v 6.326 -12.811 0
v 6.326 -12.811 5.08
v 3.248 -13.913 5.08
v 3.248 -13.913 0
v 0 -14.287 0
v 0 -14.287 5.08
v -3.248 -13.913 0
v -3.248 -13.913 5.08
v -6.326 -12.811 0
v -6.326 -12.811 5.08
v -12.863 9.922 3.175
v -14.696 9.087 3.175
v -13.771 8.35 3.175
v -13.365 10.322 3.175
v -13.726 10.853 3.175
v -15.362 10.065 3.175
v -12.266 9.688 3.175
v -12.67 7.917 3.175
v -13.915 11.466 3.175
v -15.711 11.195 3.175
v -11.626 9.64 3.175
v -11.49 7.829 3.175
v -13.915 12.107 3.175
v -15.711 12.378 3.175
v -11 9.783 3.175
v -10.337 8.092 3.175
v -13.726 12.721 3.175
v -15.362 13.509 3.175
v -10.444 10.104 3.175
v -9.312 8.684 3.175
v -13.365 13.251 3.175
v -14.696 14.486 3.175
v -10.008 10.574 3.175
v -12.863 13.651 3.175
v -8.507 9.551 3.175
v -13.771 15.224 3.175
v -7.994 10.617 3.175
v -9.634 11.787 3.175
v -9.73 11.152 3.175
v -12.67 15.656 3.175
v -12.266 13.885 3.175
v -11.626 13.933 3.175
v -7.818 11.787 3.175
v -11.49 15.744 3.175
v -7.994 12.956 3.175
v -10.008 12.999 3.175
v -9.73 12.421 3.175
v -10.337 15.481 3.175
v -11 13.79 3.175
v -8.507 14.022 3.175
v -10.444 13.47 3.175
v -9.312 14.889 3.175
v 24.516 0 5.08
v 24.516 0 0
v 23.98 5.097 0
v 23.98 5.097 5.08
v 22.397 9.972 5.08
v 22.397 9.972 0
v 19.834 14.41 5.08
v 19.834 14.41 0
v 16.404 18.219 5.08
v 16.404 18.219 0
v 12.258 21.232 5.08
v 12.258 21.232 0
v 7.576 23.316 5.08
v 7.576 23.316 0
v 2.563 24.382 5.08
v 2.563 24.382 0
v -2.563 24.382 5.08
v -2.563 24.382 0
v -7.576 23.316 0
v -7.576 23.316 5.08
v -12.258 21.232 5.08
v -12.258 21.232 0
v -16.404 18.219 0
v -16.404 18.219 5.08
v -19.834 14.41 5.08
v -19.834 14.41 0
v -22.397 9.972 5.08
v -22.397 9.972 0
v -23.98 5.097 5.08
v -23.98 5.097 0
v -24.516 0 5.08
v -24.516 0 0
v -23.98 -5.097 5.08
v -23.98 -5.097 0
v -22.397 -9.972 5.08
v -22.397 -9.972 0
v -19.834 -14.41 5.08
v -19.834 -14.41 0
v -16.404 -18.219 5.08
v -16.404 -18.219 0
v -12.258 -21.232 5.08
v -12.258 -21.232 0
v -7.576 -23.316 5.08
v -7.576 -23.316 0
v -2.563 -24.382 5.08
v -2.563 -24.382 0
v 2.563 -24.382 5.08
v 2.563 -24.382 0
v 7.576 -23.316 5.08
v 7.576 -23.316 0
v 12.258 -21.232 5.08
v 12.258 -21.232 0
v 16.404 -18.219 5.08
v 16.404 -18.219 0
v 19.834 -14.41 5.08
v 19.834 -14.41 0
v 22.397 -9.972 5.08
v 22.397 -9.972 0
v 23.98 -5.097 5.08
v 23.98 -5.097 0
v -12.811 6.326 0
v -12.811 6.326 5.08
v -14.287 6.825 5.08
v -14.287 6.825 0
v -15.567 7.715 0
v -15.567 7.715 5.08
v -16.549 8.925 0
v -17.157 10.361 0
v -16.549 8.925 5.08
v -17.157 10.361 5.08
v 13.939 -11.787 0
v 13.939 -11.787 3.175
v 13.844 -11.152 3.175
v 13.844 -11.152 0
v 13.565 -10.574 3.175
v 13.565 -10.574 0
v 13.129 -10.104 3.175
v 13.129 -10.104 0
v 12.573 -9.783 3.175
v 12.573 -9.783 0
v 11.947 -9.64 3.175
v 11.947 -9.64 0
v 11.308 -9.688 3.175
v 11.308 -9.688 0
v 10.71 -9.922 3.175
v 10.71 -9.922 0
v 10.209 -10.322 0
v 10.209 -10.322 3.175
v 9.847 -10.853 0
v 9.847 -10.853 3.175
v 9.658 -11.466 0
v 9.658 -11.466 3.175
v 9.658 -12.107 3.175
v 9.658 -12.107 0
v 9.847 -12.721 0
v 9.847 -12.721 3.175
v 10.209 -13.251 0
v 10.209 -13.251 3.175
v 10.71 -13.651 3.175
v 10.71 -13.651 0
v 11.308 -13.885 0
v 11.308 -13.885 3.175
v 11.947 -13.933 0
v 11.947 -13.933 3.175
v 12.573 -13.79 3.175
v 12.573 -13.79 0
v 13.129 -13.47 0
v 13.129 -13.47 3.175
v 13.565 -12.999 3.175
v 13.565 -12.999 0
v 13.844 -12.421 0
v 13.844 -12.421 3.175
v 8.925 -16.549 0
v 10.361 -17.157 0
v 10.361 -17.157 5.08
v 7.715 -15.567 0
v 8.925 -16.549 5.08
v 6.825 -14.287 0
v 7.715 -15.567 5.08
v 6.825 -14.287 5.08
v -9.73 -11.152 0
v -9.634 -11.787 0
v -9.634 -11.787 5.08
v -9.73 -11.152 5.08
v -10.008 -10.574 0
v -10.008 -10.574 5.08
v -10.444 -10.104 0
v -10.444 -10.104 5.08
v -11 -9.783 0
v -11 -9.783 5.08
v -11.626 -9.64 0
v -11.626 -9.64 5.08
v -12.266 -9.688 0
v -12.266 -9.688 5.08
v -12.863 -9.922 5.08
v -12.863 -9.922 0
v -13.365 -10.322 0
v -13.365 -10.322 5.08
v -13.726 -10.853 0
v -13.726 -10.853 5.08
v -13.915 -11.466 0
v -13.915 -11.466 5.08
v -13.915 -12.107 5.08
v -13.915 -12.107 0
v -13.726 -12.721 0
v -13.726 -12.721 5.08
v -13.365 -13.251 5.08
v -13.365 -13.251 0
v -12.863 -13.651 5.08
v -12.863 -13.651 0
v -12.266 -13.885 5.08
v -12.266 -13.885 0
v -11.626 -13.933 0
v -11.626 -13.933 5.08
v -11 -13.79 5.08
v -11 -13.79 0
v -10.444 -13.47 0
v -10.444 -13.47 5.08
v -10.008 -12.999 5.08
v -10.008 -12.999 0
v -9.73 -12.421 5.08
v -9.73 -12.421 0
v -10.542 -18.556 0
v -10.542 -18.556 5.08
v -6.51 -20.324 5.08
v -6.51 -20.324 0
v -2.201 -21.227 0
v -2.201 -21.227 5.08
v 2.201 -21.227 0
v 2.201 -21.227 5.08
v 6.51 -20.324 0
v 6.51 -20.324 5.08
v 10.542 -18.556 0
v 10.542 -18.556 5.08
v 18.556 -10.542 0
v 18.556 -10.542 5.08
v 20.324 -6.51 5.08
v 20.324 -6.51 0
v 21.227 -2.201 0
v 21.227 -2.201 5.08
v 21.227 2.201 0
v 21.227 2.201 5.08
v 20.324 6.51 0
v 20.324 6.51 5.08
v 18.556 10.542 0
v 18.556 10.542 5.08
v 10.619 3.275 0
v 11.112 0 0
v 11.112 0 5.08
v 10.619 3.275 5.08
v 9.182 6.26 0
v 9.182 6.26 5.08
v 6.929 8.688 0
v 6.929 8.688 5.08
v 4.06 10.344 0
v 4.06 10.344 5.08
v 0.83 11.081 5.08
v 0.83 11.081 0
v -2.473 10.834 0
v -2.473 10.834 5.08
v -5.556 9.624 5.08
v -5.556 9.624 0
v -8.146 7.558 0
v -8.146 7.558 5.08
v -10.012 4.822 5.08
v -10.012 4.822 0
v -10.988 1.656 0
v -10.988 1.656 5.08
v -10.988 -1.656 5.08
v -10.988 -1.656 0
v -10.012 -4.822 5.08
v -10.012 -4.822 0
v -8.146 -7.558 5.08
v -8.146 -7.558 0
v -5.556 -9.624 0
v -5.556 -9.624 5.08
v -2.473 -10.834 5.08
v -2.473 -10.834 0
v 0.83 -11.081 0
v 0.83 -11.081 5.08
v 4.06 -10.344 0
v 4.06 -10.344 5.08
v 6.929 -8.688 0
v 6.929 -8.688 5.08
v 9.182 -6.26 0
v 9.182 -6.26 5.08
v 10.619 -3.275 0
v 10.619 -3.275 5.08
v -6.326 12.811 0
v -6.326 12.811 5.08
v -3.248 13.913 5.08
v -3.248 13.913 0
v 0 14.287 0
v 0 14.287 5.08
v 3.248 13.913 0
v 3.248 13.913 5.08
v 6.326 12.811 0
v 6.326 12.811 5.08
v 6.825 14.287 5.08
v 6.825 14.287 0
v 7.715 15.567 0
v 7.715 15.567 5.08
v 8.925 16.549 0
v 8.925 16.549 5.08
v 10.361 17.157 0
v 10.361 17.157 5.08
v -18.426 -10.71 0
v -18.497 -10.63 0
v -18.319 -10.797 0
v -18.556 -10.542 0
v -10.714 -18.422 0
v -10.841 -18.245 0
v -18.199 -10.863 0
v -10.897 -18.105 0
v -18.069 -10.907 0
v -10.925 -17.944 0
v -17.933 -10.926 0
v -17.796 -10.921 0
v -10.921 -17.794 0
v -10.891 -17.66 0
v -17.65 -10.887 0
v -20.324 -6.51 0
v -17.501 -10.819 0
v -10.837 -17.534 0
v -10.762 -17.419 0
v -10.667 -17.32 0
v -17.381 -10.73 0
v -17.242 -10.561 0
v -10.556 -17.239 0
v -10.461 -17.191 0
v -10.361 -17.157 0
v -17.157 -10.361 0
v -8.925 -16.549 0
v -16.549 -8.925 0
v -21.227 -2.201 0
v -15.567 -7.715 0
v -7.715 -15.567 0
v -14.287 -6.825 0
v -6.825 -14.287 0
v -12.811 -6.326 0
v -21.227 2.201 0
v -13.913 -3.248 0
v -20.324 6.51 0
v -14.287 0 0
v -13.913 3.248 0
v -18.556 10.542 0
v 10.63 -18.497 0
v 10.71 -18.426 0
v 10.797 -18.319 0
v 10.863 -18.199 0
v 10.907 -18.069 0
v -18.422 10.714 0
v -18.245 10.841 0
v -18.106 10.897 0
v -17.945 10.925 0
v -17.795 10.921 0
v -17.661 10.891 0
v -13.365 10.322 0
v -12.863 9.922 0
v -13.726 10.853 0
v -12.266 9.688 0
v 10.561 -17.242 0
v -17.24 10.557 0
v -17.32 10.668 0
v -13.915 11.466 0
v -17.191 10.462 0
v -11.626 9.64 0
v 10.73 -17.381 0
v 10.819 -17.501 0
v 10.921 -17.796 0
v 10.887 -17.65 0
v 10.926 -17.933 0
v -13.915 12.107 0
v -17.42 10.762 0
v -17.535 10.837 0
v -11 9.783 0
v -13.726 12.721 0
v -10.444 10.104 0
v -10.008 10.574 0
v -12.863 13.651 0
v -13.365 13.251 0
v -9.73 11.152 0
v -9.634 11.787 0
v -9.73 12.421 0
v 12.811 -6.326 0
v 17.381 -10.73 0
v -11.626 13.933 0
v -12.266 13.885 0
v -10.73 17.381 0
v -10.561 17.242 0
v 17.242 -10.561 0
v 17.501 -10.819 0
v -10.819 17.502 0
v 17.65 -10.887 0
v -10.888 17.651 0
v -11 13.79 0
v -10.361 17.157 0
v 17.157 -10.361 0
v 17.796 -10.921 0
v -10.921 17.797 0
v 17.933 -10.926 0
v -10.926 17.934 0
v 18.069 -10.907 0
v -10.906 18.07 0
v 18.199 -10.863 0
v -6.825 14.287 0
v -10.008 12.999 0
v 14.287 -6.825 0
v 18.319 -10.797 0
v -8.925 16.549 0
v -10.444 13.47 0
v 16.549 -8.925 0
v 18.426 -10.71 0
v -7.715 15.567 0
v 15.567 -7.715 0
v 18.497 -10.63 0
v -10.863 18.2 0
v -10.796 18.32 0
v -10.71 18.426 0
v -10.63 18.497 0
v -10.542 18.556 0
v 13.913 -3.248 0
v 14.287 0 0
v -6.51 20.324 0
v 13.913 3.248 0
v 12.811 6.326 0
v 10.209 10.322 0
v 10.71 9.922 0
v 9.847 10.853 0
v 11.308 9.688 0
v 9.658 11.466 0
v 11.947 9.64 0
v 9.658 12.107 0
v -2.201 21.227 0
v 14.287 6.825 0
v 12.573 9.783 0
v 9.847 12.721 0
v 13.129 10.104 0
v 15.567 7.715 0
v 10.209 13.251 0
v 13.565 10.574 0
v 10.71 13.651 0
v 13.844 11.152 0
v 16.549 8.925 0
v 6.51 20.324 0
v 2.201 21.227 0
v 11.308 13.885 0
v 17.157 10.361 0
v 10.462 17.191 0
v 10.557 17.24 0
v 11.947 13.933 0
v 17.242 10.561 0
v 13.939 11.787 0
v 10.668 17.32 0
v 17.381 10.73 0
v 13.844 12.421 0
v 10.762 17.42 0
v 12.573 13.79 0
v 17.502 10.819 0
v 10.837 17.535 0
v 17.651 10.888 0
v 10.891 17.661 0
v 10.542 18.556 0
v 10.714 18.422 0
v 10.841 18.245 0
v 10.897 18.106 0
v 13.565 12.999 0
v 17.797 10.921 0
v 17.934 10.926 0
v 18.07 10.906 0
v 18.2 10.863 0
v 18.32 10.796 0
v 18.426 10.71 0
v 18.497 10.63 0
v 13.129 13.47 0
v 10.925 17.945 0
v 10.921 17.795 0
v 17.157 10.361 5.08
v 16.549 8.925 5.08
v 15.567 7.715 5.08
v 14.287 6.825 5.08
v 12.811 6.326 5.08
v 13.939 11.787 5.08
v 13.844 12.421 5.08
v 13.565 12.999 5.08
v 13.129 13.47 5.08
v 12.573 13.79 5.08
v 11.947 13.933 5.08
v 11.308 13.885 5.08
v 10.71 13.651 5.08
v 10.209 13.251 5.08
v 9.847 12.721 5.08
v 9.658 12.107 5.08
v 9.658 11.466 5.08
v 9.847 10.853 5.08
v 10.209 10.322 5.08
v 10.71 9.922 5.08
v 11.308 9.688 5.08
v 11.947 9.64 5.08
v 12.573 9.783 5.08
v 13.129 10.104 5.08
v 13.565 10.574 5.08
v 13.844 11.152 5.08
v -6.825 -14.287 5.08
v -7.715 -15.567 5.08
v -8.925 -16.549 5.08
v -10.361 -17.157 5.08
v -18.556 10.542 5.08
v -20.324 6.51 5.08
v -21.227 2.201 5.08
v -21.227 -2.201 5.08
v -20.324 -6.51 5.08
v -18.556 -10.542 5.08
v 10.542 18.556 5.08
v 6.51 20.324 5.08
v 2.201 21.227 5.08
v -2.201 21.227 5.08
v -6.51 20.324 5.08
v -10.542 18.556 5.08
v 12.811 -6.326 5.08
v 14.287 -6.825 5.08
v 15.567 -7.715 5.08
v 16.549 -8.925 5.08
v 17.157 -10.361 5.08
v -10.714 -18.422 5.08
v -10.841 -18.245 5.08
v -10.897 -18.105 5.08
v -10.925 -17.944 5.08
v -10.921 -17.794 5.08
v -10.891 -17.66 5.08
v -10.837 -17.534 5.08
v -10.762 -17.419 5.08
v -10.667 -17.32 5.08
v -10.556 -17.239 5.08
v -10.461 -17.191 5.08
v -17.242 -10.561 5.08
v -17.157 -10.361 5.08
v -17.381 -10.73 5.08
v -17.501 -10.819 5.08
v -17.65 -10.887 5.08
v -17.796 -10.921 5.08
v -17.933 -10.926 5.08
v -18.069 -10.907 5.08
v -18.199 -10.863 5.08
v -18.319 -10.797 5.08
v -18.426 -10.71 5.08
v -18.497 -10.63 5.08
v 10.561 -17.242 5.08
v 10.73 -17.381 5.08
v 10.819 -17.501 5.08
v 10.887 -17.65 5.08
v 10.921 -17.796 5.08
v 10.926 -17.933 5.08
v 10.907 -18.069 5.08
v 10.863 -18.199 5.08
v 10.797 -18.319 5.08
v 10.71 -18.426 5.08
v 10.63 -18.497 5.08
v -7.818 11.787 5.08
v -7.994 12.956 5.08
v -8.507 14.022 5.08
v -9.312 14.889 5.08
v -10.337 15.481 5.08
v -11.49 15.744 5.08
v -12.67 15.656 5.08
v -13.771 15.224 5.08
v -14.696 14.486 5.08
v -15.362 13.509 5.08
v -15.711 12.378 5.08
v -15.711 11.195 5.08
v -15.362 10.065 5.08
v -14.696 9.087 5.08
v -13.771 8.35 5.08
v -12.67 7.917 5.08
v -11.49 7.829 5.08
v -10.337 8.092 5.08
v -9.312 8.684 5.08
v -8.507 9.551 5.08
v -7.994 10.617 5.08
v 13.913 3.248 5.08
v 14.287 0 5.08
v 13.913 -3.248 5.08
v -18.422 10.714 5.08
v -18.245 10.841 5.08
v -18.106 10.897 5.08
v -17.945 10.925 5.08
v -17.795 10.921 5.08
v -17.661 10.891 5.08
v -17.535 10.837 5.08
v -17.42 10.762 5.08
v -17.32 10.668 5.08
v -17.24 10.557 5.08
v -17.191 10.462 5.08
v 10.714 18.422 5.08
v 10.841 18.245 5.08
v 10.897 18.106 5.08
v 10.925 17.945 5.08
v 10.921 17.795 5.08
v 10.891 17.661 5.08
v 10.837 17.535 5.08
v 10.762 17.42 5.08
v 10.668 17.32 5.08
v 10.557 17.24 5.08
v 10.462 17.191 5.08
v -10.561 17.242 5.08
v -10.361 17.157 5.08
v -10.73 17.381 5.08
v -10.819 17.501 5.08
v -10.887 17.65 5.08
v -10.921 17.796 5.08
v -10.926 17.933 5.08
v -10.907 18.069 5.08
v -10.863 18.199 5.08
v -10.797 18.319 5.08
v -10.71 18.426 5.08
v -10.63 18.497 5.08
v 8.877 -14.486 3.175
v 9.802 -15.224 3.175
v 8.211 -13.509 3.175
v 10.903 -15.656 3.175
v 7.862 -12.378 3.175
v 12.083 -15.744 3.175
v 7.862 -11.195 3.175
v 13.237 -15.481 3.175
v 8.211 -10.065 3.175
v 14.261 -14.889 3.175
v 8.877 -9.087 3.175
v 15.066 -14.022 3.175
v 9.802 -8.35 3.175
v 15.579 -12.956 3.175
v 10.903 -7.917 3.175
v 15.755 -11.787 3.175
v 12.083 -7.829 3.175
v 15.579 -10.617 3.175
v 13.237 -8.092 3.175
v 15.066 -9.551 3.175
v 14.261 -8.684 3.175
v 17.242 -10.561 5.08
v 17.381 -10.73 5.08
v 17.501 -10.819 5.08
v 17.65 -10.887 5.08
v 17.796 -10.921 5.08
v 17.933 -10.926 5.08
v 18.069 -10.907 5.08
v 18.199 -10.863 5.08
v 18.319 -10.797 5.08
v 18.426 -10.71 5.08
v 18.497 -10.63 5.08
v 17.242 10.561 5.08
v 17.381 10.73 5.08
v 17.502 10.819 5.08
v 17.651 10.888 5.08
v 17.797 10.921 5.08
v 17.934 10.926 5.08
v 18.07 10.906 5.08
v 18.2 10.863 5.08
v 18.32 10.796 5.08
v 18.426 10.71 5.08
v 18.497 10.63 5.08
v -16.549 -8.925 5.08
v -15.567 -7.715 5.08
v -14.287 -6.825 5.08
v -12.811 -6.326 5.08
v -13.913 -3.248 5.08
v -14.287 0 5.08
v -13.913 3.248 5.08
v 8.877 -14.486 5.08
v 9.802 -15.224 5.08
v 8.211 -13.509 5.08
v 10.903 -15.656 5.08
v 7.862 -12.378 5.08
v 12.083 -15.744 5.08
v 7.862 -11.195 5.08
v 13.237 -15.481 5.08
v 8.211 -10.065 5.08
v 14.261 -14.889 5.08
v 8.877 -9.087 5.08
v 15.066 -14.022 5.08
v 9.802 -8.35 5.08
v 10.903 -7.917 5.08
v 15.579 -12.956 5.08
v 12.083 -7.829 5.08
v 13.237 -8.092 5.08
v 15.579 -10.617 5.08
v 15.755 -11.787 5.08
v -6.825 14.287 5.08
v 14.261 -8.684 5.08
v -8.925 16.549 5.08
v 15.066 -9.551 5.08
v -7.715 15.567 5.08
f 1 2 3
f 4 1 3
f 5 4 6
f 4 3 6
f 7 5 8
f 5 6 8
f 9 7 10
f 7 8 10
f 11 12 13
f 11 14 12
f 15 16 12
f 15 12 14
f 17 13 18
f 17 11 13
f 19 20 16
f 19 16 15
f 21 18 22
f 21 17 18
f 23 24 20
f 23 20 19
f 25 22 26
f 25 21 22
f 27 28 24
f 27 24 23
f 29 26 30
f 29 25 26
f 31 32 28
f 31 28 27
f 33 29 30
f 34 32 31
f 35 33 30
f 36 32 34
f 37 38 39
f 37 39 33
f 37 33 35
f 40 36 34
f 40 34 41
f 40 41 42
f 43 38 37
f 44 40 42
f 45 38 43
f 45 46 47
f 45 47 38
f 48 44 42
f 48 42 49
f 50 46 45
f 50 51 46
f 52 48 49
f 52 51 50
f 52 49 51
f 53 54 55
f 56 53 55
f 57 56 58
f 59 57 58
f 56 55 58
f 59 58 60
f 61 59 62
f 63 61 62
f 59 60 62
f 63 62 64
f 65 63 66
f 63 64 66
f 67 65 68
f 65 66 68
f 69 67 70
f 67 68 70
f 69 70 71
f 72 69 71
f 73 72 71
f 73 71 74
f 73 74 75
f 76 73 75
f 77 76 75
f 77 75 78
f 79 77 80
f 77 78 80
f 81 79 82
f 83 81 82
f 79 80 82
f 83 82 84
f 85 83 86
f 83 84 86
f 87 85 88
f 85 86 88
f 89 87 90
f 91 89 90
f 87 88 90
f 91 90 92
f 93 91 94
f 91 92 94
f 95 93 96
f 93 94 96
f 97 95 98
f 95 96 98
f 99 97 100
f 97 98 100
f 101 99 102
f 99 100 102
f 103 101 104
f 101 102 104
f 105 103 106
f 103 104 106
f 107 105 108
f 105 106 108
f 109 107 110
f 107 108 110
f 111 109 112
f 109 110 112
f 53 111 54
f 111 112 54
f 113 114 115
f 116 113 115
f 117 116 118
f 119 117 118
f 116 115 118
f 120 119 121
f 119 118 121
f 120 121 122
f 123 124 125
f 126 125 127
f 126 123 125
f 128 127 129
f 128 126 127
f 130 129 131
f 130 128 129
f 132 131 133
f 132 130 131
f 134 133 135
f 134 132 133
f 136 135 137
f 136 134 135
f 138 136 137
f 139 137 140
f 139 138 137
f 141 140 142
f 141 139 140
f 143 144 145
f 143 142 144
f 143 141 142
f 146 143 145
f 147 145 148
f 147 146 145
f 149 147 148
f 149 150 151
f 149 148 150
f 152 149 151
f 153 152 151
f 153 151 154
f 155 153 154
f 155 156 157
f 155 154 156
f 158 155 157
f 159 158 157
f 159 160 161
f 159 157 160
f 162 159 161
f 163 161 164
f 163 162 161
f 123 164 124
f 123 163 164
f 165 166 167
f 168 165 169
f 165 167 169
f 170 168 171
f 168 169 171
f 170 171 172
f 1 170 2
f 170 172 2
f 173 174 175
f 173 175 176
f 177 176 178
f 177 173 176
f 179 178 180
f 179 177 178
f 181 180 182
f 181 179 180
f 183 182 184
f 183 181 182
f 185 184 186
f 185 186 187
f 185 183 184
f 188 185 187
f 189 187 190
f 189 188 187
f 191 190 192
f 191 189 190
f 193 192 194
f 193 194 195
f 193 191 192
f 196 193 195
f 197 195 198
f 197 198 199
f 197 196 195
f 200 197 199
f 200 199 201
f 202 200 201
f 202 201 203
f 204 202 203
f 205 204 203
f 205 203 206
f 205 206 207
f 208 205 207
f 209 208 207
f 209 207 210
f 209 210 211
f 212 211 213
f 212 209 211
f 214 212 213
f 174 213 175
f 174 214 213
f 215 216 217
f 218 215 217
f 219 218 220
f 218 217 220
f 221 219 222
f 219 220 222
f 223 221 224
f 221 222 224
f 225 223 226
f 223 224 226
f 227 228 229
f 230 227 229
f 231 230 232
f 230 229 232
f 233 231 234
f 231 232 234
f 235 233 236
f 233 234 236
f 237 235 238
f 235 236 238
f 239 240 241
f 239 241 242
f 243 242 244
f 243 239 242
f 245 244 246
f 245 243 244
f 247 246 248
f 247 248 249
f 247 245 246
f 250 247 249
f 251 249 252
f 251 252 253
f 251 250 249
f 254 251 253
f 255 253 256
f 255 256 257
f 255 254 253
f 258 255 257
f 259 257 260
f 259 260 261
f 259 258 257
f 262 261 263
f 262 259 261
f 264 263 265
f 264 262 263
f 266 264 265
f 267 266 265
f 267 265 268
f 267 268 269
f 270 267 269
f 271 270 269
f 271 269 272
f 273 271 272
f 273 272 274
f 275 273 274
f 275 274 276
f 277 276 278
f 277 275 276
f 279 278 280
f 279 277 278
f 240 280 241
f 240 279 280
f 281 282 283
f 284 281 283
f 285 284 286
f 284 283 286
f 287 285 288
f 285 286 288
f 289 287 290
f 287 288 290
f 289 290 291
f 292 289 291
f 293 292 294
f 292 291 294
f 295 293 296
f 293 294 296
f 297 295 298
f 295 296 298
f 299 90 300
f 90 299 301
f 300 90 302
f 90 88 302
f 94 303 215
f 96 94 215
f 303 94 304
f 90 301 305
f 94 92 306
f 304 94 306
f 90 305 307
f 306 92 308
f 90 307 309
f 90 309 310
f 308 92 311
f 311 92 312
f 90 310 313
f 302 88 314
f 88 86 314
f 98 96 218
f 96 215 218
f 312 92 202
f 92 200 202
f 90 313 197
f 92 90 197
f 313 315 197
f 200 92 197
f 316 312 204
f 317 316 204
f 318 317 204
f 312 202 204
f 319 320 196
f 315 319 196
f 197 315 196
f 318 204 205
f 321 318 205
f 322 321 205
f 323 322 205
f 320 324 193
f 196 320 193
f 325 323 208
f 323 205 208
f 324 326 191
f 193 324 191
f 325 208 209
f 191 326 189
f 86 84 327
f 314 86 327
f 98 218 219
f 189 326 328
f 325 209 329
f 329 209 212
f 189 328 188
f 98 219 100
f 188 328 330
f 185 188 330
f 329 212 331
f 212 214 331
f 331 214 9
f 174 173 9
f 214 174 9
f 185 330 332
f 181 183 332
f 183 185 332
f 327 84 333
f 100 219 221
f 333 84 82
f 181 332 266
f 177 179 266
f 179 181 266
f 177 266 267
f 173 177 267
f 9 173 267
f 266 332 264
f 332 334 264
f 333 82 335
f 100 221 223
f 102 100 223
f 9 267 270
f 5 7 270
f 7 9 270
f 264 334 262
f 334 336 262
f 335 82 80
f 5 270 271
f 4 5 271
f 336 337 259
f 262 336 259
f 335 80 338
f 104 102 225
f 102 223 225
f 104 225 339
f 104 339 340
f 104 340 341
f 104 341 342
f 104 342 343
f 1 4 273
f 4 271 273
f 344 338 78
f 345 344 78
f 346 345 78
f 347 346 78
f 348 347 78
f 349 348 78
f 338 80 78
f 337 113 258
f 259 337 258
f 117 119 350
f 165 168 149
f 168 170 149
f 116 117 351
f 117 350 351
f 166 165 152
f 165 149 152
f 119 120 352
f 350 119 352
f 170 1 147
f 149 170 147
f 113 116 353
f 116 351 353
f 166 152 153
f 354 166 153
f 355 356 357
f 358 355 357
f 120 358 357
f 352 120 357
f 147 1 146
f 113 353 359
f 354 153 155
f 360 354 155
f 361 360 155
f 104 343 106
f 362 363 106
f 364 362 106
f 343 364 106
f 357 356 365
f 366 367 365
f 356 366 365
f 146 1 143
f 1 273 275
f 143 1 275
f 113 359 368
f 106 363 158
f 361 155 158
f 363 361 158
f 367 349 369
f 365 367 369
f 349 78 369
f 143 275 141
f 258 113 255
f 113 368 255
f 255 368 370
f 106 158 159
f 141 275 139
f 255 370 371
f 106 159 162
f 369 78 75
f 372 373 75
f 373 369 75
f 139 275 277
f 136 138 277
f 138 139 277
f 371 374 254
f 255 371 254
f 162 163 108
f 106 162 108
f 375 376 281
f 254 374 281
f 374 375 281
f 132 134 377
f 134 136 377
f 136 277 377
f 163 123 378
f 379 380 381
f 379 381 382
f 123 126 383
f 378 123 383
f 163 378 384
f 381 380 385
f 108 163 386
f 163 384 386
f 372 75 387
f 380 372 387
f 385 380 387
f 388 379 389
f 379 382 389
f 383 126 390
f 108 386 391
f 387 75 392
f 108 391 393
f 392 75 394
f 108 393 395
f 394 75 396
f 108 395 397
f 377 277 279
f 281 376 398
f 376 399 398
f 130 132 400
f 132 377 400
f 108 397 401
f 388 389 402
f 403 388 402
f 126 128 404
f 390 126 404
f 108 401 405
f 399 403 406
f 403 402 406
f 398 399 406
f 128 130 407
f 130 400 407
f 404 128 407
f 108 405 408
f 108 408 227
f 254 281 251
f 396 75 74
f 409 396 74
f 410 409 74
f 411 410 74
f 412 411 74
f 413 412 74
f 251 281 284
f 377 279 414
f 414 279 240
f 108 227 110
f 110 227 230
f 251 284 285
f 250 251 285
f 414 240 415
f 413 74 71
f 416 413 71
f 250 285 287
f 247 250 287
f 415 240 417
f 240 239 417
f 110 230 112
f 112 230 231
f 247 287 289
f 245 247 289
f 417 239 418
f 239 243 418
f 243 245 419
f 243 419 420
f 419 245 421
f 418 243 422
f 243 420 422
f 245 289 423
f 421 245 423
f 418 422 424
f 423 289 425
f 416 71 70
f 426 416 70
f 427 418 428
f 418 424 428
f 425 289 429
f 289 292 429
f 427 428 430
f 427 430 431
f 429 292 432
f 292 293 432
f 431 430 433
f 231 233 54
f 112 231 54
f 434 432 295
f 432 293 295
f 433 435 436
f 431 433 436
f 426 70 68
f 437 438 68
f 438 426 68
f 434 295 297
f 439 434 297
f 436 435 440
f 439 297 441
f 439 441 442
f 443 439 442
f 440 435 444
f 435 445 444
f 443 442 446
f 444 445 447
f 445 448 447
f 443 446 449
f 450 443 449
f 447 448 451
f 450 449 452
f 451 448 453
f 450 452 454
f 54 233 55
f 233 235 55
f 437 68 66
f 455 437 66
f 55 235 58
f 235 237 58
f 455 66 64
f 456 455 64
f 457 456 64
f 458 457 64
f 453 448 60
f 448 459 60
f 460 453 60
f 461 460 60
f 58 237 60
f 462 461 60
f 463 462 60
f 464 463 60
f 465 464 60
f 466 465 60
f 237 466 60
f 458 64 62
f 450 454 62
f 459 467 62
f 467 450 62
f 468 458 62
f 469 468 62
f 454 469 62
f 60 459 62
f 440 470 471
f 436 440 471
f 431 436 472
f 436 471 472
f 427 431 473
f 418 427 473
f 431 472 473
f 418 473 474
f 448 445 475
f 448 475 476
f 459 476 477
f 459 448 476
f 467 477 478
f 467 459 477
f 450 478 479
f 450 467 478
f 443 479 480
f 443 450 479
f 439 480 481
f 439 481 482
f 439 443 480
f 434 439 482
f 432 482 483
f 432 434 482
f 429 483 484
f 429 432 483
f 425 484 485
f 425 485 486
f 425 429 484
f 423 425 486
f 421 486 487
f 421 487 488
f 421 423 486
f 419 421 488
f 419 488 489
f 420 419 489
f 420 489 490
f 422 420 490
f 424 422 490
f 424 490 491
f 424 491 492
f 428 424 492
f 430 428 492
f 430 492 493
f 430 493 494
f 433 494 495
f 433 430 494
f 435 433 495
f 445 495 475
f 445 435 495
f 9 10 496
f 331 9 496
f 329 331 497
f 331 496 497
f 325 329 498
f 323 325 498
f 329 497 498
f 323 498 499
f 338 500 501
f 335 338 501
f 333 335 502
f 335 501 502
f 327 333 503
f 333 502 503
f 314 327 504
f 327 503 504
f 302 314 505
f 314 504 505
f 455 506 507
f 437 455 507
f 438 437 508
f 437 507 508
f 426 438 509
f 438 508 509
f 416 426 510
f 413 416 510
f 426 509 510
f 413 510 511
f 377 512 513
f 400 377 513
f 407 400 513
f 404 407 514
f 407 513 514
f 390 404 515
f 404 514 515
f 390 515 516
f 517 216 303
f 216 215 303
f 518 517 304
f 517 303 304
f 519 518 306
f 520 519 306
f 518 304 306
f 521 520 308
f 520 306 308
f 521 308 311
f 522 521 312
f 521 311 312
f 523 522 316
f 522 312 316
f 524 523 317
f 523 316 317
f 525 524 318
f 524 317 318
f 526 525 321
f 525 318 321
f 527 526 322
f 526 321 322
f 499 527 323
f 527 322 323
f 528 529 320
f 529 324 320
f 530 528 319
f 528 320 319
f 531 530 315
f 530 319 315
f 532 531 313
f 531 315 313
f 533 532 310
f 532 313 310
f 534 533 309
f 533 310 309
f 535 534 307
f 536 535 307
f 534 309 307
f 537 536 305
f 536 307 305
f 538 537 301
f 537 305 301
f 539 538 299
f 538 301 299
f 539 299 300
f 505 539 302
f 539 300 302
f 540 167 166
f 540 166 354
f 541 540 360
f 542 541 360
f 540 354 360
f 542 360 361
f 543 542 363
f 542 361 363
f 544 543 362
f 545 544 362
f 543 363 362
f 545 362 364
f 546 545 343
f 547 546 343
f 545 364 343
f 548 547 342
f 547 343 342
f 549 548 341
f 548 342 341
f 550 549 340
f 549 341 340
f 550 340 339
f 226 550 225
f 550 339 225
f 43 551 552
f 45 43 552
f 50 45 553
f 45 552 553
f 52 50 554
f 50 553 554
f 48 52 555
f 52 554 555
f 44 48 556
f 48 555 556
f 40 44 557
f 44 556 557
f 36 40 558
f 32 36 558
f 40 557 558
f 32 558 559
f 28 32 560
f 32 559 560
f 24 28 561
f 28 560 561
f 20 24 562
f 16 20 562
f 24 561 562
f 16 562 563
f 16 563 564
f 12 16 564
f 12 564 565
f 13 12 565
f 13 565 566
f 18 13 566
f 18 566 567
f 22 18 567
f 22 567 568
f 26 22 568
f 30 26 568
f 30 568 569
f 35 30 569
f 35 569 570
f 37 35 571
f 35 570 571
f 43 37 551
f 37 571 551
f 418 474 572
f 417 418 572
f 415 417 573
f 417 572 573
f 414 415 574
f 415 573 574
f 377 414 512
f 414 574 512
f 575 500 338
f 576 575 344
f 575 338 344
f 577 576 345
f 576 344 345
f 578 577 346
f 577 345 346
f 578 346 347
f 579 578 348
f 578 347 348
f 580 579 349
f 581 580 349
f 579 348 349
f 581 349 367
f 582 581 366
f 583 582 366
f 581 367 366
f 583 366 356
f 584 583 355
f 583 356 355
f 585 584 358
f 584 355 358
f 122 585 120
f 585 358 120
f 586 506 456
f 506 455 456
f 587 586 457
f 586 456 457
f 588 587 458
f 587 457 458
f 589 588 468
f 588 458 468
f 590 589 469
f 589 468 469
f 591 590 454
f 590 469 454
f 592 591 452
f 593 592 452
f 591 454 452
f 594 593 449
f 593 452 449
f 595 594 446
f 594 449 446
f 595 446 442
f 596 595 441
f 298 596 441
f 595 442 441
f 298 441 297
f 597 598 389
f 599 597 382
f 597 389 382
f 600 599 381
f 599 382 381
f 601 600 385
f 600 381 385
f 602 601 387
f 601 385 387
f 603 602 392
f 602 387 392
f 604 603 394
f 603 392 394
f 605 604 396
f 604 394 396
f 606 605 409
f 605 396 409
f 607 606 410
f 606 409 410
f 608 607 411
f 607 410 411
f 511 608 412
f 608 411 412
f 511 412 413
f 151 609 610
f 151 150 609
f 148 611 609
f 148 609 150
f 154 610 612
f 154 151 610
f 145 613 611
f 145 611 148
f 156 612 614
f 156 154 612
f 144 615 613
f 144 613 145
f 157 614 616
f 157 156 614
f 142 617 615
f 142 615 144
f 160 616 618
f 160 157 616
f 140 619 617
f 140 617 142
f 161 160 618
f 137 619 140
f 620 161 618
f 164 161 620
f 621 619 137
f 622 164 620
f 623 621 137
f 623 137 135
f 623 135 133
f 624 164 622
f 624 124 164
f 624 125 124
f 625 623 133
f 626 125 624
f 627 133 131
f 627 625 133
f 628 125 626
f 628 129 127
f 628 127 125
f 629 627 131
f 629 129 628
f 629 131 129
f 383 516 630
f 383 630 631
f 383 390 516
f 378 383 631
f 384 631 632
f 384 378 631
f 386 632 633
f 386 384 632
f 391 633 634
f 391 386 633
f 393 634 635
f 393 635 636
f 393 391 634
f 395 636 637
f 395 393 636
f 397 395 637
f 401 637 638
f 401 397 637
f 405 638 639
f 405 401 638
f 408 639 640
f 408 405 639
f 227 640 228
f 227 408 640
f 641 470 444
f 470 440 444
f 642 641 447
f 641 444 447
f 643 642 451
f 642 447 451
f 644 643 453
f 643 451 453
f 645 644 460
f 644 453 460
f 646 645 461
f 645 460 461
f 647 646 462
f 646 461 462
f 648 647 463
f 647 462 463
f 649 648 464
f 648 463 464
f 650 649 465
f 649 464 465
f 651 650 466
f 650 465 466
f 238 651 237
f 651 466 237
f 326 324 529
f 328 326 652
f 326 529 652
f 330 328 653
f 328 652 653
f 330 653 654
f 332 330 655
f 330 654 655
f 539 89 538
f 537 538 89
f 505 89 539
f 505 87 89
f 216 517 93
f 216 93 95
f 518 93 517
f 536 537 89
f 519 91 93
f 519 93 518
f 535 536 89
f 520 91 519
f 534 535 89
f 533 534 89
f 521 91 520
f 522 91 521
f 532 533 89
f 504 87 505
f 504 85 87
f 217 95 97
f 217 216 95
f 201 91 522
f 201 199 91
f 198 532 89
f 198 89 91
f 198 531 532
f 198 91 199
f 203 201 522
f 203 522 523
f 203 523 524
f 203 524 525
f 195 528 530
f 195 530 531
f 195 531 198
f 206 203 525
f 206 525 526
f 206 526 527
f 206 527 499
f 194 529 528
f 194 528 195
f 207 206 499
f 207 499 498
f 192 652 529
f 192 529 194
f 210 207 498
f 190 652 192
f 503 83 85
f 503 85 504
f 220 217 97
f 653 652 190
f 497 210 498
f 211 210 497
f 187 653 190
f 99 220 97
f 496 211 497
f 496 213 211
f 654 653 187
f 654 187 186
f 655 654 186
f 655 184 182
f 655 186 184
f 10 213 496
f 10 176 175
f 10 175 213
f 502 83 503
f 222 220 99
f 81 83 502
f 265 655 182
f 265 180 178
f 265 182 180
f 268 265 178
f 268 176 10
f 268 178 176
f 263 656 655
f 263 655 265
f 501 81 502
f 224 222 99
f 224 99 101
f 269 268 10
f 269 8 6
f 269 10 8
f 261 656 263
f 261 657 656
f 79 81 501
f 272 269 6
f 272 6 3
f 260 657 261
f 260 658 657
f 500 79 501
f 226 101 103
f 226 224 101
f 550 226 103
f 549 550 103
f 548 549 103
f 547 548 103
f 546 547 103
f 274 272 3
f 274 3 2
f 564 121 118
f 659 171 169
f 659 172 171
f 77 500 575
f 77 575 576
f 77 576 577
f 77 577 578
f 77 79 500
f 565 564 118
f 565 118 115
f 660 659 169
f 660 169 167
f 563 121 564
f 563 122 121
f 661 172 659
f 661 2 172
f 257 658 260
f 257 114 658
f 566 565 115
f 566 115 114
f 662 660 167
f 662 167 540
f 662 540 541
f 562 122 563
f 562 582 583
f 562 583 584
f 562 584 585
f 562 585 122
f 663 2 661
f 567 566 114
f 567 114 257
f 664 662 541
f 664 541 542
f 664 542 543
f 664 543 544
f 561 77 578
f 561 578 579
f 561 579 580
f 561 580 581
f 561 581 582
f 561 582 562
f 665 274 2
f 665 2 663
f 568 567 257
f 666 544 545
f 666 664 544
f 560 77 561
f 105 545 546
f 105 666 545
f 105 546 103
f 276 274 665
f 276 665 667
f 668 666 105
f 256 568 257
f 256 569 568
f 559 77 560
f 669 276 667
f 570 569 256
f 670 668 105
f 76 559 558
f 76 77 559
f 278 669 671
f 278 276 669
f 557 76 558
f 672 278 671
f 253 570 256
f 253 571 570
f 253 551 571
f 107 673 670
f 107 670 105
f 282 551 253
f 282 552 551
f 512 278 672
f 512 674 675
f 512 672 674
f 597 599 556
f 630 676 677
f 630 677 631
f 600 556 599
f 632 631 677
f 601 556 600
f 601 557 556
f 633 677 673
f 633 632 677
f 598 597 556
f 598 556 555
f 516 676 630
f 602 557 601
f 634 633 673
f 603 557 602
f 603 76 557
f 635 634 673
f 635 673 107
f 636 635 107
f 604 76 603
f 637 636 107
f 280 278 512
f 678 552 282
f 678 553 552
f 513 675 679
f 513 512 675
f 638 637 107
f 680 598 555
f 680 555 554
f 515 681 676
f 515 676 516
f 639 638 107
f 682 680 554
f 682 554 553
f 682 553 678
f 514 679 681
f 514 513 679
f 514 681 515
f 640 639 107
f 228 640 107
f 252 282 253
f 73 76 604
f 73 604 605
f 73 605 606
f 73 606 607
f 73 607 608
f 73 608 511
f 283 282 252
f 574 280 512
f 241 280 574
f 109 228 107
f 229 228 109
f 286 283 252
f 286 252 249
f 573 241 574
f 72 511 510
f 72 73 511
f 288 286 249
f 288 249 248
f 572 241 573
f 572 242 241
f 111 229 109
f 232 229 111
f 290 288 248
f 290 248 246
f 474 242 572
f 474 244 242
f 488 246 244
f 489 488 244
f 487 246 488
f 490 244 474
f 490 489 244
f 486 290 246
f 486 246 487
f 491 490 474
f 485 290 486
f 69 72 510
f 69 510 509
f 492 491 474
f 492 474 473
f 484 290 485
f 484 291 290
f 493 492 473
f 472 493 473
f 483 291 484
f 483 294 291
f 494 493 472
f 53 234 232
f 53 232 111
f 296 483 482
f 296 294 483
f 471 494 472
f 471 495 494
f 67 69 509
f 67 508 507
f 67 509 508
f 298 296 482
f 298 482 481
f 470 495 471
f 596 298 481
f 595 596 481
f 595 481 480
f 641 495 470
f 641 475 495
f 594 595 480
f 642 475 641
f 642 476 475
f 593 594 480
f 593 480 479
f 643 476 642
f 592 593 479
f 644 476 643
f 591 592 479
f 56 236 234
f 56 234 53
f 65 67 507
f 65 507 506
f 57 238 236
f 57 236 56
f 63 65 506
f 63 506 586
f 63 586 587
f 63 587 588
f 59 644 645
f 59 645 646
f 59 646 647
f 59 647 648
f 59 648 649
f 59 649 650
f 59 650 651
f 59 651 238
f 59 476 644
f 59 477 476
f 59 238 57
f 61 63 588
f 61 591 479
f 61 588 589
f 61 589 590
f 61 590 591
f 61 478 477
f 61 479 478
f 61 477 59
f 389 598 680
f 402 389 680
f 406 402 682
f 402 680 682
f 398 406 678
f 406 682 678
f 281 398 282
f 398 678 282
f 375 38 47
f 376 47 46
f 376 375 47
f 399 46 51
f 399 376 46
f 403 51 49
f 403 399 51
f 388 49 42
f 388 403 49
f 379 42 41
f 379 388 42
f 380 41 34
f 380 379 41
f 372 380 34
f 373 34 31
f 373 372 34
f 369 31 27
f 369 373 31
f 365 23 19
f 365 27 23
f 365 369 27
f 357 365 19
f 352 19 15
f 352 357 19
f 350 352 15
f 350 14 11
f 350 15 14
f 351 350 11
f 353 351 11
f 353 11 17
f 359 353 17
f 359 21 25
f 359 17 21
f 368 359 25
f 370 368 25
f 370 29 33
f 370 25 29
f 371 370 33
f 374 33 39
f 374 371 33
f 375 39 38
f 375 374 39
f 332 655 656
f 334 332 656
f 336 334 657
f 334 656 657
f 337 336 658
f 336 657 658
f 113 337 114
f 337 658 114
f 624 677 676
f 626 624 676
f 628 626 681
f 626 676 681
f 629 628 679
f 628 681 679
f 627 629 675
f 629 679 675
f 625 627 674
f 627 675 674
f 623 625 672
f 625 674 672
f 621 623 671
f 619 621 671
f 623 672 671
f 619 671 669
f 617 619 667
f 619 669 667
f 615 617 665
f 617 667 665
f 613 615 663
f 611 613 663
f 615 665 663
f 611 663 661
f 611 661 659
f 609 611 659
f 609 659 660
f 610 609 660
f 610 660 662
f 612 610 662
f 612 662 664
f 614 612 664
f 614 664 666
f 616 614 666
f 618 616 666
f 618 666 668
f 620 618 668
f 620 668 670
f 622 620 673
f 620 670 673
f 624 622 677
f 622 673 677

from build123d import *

# Parameters (mm, degrees)
F0_R            = 24.51608
F0_R_2          = 2.15265
F0_R_3          = 11.1125
F1_DEPTH        = 5.08
F3_DEPTH        = 5.08
F3_COPIES_COUNT = 4
F4_R            = 0.762
F6_R            = 3.96875
F7_DEPTH        = 1.905


# Not quite as in the source:
# - a pattern or mirror of a feature is missing from the dataset's text; its kind, count and spacing are read off the source's solid


with BuildPart() as f1:
    # F0 (on Top) → F1 (new body)
    with BuildSketch(Plane.XY):
        Circle(F0_R)
        with Locations((-11.7865906, -11.7865906)):
            Circle(F0_R_2, mode=Mode.SUBTRACT)
        with Locations((11.7865906, -11.7865906)):
            Circle(F0_R_2, mode=Mode.SUBTRACT)
        with Locations((-11.7865906, 11.7865906)):
            Circle(F0_R_2, mode=Mode.SUBTRACT)
        Circle(F0_R_3, mode=Mode.SUBTRACT)
        with Locations((11.7865906, 11.7865906)):
            Circle(F0_R_2, mode=Mode.SUBTRACT)
    extrude(amount=F1_DEPTH)

    # F2 (on face) → F3 (cut, through all)
    with BuildSketch(Plane.XY.offset(5.08)):
        with BuildLine():
            ThreePointArc((-12.5005198818, 17.2967828873), (-8.5209455851, 16.2818633057), (-6.3255779254, 12.810921909))
            ThreePointArc((-6.3255779254, 12.810921909), (0, 14.2875), (6.3255779254, 12.810921909))
            ThreePointArc((6.3255779254, 12.810921909), (8.5209455851, 16.2818633057), (12.5005198818, 17.2967828873))
            ThreePointArc((12.5005198818, 17.2967828873), (0, 21.34108), (-12.5005198818, 17.2967828873))
        make_face()
    f3 = extrude(amount=-F3_DEPTH, mode=Mode.SUBTRACT)

    # F3_copies: F3 ×4 about axis
    f3_copies_axis = Axis((0, 0, 0), (0, 0, 1))
    for i in range(1, F3_COPIES_COUNT):
        add(f3.rotate(f3_copies_axis, i * 360 / F3_COPIES_COUNT), mode=Mode.SUBTRACT)

    # F4
    f4_edges = [f1.edges().sort_by_distance(p)[0] for p in [
        (-12.50052, 17.296783, 2.54),
        (12.50052, 17.296783, 2.54),
        (-17.296783, 12.50052, 2.54),
        (-17.296783, -12.50052, 2.54),
        (-12.50052, -17.296783, 2.54),
        (12.50052, -17.296783, 2.54),
        (17.296783, -12.50052, 2.54),
        (17.296783, 12.50052, 2.54),
    ]]
    fillet(f4_edges, radius=F4_R)

    # F6 (on face) → F7 (cut, through all)
    with BuildSketch(Plane.XY.offset(5.08)):
        with Locations((11.7865906, -11.7865906)):
            Circle(F6_R)
        with Locations((-11.7865906, 11.7865906)):
            Circle(F6_R)
    extrude(amount=-F7_DEPTH, mode=Mode.SUBTRACT)


solid = f1.part
